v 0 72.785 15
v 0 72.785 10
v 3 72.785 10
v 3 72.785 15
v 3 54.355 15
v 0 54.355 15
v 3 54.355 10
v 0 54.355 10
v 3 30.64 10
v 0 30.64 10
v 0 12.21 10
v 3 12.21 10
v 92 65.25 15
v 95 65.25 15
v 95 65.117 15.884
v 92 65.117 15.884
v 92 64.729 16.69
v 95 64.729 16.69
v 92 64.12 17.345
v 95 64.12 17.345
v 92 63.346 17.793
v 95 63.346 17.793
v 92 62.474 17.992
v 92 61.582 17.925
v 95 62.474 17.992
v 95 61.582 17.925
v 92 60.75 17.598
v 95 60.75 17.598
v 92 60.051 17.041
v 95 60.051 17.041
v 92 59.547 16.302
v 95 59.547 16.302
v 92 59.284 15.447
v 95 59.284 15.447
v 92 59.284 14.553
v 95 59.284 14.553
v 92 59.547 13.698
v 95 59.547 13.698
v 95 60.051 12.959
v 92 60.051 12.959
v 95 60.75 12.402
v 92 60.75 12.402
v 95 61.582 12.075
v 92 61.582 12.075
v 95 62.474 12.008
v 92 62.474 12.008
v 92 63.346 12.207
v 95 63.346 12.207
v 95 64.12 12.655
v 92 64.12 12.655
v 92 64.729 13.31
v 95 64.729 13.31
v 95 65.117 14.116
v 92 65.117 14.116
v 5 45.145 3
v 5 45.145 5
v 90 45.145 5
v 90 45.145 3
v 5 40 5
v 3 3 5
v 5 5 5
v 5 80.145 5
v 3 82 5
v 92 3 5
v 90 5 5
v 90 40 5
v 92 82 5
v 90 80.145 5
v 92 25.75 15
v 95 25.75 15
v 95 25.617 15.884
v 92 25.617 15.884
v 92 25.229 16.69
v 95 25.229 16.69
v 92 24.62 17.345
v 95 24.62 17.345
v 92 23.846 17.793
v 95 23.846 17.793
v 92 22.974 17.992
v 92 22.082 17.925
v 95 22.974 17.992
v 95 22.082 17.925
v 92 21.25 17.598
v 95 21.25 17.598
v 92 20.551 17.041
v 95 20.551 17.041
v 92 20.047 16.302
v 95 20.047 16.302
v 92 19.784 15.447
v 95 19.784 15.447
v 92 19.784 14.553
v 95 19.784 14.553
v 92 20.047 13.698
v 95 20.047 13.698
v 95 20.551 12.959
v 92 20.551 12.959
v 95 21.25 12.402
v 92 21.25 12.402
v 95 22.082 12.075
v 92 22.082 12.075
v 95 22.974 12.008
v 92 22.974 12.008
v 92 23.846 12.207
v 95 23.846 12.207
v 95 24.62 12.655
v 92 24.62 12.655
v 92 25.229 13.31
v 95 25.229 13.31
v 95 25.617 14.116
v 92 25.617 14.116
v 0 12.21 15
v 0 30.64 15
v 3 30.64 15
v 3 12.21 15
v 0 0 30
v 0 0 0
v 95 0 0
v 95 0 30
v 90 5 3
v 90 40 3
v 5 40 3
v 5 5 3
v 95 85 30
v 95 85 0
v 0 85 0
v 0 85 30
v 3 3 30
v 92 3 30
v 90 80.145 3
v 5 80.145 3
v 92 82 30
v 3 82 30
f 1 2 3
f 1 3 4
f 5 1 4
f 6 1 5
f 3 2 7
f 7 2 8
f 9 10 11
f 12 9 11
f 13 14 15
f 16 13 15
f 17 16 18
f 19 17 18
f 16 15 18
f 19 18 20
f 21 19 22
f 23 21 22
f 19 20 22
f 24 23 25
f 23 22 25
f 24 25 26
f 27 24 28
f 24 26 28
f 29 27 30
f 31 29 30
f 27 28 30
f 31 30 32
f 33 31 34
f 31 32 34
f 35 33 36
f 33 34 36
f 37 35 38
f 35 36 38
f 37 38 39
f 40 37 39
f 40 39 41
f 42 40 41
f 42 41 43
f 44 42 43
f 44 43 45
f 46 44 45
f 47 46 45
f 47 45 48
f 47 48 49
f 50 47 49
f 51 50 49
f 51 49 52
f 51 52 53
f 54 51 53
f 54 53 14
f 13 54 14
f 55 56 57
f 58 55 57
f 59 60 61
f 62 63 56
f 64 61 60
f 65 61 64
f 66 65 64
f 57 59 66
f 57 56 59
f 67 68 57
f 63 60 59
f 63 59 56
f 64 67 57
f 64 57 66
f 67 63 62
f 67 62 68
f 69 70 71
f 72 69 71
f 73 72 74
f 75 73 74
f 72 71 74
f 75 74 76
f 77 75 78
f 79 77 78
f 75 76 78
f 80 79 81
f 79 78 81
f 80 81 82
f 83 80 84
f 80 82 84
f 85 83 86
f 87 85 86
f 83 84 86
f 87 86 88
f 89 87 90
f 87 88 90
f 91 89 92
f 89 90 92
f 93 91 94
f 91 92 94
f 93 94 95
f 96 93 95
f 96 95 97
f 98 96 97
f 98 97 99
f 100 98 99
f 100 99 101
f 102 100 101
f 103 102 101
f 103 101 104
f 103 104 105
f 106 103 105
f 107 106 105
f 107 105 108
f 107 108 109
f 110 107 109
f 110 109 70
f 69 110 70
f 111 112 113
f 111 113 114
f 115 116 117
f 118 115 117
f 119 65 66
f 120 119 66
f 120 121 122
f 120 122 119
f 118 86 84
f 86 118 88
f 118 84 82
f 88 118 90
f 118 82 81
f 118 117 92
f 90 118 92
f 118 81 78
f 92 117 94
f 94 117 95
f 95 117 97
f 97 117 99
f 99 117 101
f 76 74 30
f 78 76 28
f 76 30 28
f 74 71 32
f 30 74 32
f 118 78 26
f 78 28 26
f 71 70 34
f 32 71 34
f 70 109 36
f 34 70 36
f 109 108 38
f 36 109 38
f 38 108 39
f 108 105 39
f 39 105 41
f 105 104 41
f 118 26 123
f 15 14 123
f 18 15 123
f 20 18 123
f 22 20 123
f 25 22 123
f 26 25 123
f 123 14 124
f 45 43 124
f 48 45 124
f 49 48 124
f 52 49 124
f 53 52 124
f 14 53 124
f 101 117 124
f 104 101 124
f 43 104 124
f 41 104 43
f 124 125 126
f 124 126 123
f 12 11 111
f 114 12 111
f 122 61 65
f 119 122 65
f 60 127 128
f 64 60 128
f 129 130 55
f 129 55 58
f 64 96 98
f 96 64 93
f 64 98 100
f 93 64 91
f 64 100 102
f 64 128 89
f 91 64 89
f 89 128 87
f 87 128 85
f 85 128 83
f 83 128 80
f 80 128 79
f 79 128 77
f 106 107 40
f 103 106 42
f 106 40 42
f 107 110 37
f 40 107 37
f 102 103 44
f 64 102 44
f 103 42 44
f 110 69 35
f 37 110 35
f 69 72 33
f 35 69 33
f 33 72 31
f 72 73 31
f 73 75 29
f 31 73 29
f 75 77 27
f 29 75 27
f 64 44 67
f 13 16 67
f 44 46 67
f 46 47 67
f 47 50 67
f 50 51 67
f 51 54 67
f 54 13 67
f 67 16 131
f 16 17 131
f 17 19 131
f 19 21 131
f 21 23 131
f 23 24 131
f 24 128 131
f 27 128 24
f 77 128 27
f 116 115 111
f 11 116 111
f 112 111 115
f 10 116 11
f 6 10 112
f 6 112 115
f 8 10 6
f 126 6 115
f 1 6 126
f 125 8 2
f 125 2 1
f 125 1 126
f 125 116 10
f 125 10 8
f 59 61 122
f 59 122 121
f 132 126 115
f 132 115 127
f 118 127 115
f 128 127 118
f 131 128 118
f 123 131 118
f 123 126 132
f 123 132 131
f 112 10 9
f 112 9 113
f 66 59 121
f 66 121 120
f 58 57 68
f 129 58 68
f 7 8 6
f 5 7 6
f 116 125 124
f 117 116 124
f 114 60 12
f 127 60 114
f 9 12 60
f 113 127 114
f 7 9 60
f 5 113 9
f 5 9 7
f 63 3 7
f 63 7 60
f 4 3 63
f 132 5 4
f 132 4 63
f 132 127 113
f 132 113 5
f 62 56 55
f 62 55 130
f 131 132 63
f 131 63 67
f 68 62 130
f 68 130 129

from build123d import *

# Parameters (mm, degrees)
SKETCH_W        = 95
SKETCH_H        = 85
EXTRUDE_DEPTH   = 30
SKETCH002_W     = 89
SKETCH002_H     = 79
POCKET_DEPTH    = 25
SKETCH001_W     = 85
SKETCH001_H     = 35
POCKET001_DEPTH = 27
SKETCH003_R     = 3
HOLE_DEPTH      = 25
HOLE_TIPS_R     = 3
SKETCH004_W     = 18.43
SKETCH004_H     = 5
POCKET002_DEPTH = 3


with BuildPart() as part:
    # Sketch → Extrude (new body)
    with BuildSketch(Plane.XY):
        with Locations((47.5, 42.5)):
            Rectangle(SKETCH_W, SKETCH_H)
    extrude(amount=EXTRUDE_DEPTH)

    # Sketch002 (on Face6 of BaseFeature) → Pocket (cut)
    with BuildSketch(Plane.XY.offset(30)):
        with Locations((47.5, 42.5)):
            Rectangle(SKETCH002_W, SKETCH002_H)
    extrude(amount=-POCKET_DEPTH, mode=Mode.SUBTRACT)

    # Sketch001 (on Face6 of BaseFeature) → Pocket001 (cut)
    with BuildSketch(Plane.XY.offset(30)):
        with Locations((47.5, 62.644853)):
            Rectangle(SKETCH001_W, SKETCH001_H)
        with Locations((47.5, 22.5)):
            Rectangle(SKETCH001_W, SKETCH001_H)
    extrude(amount=-POCKET001_DEPTH, mode=Mode.SUBTRACT)

    # Sketch003 (on Face3 of Pocket001) → Hole (cut)
    with BuildSketch(Plane.YZ.offset(95)):
        with Locations((22.75, 15)):
            Circle(SKETCH003_R)
        with Locations((62.25, 15)):
            Circle(SKETCH003_R)
    extrude(amount=-HOLE_DEPTH, mode=Mode.SUBTRACT)

    # Hole tips → Hole tip 1 section 0
    with BuildSketch(Plane.YZ.offset(70), mode=Mode.PRIVATE) as hole_tip_1_s0:
        with Locations((22.75, 15)):
            Circle(HOLE_TIPS_R)
    loft([hole_tip_1_s0.sketch, Vertex(68.197418, 22.75, 15)], mode=Mode.SUBTRACT)

    # Hole tips → Hole tip 2 section 0
    with BuildSketch(Plane.YZ.offset(70), mode=Mode.PRIVATE) as hole_tip_2_s0:
        with Locations((62.25, 15)):
            Circle(HOLE_TIPS_R)
    loft([hole_tip_2_s0.sketch, Vertex(68.197418, 62.25, 15)], mode=Mode.SUBTRACT)

    # Sketch004 (on Face2 of Hole) → Pocket002 (cut)
    with BuildSketch(Plane(origin=(0, 0, 0), x_dir=(0, -1, 0), z_dir=(-1, 0, 0))):
        with Locations((-63.57, 12.5)):
            Rectangle(SKETCH004_W, SKETCH004_H)
        with Locations((-21.425, 12.5)):
            Rectangle(SKETCH004_W, SKETCH004_H)
    extrude(amount=-POCKET002_DEPTH, mode=Mode.SUBTRACT)


solid = part.part
